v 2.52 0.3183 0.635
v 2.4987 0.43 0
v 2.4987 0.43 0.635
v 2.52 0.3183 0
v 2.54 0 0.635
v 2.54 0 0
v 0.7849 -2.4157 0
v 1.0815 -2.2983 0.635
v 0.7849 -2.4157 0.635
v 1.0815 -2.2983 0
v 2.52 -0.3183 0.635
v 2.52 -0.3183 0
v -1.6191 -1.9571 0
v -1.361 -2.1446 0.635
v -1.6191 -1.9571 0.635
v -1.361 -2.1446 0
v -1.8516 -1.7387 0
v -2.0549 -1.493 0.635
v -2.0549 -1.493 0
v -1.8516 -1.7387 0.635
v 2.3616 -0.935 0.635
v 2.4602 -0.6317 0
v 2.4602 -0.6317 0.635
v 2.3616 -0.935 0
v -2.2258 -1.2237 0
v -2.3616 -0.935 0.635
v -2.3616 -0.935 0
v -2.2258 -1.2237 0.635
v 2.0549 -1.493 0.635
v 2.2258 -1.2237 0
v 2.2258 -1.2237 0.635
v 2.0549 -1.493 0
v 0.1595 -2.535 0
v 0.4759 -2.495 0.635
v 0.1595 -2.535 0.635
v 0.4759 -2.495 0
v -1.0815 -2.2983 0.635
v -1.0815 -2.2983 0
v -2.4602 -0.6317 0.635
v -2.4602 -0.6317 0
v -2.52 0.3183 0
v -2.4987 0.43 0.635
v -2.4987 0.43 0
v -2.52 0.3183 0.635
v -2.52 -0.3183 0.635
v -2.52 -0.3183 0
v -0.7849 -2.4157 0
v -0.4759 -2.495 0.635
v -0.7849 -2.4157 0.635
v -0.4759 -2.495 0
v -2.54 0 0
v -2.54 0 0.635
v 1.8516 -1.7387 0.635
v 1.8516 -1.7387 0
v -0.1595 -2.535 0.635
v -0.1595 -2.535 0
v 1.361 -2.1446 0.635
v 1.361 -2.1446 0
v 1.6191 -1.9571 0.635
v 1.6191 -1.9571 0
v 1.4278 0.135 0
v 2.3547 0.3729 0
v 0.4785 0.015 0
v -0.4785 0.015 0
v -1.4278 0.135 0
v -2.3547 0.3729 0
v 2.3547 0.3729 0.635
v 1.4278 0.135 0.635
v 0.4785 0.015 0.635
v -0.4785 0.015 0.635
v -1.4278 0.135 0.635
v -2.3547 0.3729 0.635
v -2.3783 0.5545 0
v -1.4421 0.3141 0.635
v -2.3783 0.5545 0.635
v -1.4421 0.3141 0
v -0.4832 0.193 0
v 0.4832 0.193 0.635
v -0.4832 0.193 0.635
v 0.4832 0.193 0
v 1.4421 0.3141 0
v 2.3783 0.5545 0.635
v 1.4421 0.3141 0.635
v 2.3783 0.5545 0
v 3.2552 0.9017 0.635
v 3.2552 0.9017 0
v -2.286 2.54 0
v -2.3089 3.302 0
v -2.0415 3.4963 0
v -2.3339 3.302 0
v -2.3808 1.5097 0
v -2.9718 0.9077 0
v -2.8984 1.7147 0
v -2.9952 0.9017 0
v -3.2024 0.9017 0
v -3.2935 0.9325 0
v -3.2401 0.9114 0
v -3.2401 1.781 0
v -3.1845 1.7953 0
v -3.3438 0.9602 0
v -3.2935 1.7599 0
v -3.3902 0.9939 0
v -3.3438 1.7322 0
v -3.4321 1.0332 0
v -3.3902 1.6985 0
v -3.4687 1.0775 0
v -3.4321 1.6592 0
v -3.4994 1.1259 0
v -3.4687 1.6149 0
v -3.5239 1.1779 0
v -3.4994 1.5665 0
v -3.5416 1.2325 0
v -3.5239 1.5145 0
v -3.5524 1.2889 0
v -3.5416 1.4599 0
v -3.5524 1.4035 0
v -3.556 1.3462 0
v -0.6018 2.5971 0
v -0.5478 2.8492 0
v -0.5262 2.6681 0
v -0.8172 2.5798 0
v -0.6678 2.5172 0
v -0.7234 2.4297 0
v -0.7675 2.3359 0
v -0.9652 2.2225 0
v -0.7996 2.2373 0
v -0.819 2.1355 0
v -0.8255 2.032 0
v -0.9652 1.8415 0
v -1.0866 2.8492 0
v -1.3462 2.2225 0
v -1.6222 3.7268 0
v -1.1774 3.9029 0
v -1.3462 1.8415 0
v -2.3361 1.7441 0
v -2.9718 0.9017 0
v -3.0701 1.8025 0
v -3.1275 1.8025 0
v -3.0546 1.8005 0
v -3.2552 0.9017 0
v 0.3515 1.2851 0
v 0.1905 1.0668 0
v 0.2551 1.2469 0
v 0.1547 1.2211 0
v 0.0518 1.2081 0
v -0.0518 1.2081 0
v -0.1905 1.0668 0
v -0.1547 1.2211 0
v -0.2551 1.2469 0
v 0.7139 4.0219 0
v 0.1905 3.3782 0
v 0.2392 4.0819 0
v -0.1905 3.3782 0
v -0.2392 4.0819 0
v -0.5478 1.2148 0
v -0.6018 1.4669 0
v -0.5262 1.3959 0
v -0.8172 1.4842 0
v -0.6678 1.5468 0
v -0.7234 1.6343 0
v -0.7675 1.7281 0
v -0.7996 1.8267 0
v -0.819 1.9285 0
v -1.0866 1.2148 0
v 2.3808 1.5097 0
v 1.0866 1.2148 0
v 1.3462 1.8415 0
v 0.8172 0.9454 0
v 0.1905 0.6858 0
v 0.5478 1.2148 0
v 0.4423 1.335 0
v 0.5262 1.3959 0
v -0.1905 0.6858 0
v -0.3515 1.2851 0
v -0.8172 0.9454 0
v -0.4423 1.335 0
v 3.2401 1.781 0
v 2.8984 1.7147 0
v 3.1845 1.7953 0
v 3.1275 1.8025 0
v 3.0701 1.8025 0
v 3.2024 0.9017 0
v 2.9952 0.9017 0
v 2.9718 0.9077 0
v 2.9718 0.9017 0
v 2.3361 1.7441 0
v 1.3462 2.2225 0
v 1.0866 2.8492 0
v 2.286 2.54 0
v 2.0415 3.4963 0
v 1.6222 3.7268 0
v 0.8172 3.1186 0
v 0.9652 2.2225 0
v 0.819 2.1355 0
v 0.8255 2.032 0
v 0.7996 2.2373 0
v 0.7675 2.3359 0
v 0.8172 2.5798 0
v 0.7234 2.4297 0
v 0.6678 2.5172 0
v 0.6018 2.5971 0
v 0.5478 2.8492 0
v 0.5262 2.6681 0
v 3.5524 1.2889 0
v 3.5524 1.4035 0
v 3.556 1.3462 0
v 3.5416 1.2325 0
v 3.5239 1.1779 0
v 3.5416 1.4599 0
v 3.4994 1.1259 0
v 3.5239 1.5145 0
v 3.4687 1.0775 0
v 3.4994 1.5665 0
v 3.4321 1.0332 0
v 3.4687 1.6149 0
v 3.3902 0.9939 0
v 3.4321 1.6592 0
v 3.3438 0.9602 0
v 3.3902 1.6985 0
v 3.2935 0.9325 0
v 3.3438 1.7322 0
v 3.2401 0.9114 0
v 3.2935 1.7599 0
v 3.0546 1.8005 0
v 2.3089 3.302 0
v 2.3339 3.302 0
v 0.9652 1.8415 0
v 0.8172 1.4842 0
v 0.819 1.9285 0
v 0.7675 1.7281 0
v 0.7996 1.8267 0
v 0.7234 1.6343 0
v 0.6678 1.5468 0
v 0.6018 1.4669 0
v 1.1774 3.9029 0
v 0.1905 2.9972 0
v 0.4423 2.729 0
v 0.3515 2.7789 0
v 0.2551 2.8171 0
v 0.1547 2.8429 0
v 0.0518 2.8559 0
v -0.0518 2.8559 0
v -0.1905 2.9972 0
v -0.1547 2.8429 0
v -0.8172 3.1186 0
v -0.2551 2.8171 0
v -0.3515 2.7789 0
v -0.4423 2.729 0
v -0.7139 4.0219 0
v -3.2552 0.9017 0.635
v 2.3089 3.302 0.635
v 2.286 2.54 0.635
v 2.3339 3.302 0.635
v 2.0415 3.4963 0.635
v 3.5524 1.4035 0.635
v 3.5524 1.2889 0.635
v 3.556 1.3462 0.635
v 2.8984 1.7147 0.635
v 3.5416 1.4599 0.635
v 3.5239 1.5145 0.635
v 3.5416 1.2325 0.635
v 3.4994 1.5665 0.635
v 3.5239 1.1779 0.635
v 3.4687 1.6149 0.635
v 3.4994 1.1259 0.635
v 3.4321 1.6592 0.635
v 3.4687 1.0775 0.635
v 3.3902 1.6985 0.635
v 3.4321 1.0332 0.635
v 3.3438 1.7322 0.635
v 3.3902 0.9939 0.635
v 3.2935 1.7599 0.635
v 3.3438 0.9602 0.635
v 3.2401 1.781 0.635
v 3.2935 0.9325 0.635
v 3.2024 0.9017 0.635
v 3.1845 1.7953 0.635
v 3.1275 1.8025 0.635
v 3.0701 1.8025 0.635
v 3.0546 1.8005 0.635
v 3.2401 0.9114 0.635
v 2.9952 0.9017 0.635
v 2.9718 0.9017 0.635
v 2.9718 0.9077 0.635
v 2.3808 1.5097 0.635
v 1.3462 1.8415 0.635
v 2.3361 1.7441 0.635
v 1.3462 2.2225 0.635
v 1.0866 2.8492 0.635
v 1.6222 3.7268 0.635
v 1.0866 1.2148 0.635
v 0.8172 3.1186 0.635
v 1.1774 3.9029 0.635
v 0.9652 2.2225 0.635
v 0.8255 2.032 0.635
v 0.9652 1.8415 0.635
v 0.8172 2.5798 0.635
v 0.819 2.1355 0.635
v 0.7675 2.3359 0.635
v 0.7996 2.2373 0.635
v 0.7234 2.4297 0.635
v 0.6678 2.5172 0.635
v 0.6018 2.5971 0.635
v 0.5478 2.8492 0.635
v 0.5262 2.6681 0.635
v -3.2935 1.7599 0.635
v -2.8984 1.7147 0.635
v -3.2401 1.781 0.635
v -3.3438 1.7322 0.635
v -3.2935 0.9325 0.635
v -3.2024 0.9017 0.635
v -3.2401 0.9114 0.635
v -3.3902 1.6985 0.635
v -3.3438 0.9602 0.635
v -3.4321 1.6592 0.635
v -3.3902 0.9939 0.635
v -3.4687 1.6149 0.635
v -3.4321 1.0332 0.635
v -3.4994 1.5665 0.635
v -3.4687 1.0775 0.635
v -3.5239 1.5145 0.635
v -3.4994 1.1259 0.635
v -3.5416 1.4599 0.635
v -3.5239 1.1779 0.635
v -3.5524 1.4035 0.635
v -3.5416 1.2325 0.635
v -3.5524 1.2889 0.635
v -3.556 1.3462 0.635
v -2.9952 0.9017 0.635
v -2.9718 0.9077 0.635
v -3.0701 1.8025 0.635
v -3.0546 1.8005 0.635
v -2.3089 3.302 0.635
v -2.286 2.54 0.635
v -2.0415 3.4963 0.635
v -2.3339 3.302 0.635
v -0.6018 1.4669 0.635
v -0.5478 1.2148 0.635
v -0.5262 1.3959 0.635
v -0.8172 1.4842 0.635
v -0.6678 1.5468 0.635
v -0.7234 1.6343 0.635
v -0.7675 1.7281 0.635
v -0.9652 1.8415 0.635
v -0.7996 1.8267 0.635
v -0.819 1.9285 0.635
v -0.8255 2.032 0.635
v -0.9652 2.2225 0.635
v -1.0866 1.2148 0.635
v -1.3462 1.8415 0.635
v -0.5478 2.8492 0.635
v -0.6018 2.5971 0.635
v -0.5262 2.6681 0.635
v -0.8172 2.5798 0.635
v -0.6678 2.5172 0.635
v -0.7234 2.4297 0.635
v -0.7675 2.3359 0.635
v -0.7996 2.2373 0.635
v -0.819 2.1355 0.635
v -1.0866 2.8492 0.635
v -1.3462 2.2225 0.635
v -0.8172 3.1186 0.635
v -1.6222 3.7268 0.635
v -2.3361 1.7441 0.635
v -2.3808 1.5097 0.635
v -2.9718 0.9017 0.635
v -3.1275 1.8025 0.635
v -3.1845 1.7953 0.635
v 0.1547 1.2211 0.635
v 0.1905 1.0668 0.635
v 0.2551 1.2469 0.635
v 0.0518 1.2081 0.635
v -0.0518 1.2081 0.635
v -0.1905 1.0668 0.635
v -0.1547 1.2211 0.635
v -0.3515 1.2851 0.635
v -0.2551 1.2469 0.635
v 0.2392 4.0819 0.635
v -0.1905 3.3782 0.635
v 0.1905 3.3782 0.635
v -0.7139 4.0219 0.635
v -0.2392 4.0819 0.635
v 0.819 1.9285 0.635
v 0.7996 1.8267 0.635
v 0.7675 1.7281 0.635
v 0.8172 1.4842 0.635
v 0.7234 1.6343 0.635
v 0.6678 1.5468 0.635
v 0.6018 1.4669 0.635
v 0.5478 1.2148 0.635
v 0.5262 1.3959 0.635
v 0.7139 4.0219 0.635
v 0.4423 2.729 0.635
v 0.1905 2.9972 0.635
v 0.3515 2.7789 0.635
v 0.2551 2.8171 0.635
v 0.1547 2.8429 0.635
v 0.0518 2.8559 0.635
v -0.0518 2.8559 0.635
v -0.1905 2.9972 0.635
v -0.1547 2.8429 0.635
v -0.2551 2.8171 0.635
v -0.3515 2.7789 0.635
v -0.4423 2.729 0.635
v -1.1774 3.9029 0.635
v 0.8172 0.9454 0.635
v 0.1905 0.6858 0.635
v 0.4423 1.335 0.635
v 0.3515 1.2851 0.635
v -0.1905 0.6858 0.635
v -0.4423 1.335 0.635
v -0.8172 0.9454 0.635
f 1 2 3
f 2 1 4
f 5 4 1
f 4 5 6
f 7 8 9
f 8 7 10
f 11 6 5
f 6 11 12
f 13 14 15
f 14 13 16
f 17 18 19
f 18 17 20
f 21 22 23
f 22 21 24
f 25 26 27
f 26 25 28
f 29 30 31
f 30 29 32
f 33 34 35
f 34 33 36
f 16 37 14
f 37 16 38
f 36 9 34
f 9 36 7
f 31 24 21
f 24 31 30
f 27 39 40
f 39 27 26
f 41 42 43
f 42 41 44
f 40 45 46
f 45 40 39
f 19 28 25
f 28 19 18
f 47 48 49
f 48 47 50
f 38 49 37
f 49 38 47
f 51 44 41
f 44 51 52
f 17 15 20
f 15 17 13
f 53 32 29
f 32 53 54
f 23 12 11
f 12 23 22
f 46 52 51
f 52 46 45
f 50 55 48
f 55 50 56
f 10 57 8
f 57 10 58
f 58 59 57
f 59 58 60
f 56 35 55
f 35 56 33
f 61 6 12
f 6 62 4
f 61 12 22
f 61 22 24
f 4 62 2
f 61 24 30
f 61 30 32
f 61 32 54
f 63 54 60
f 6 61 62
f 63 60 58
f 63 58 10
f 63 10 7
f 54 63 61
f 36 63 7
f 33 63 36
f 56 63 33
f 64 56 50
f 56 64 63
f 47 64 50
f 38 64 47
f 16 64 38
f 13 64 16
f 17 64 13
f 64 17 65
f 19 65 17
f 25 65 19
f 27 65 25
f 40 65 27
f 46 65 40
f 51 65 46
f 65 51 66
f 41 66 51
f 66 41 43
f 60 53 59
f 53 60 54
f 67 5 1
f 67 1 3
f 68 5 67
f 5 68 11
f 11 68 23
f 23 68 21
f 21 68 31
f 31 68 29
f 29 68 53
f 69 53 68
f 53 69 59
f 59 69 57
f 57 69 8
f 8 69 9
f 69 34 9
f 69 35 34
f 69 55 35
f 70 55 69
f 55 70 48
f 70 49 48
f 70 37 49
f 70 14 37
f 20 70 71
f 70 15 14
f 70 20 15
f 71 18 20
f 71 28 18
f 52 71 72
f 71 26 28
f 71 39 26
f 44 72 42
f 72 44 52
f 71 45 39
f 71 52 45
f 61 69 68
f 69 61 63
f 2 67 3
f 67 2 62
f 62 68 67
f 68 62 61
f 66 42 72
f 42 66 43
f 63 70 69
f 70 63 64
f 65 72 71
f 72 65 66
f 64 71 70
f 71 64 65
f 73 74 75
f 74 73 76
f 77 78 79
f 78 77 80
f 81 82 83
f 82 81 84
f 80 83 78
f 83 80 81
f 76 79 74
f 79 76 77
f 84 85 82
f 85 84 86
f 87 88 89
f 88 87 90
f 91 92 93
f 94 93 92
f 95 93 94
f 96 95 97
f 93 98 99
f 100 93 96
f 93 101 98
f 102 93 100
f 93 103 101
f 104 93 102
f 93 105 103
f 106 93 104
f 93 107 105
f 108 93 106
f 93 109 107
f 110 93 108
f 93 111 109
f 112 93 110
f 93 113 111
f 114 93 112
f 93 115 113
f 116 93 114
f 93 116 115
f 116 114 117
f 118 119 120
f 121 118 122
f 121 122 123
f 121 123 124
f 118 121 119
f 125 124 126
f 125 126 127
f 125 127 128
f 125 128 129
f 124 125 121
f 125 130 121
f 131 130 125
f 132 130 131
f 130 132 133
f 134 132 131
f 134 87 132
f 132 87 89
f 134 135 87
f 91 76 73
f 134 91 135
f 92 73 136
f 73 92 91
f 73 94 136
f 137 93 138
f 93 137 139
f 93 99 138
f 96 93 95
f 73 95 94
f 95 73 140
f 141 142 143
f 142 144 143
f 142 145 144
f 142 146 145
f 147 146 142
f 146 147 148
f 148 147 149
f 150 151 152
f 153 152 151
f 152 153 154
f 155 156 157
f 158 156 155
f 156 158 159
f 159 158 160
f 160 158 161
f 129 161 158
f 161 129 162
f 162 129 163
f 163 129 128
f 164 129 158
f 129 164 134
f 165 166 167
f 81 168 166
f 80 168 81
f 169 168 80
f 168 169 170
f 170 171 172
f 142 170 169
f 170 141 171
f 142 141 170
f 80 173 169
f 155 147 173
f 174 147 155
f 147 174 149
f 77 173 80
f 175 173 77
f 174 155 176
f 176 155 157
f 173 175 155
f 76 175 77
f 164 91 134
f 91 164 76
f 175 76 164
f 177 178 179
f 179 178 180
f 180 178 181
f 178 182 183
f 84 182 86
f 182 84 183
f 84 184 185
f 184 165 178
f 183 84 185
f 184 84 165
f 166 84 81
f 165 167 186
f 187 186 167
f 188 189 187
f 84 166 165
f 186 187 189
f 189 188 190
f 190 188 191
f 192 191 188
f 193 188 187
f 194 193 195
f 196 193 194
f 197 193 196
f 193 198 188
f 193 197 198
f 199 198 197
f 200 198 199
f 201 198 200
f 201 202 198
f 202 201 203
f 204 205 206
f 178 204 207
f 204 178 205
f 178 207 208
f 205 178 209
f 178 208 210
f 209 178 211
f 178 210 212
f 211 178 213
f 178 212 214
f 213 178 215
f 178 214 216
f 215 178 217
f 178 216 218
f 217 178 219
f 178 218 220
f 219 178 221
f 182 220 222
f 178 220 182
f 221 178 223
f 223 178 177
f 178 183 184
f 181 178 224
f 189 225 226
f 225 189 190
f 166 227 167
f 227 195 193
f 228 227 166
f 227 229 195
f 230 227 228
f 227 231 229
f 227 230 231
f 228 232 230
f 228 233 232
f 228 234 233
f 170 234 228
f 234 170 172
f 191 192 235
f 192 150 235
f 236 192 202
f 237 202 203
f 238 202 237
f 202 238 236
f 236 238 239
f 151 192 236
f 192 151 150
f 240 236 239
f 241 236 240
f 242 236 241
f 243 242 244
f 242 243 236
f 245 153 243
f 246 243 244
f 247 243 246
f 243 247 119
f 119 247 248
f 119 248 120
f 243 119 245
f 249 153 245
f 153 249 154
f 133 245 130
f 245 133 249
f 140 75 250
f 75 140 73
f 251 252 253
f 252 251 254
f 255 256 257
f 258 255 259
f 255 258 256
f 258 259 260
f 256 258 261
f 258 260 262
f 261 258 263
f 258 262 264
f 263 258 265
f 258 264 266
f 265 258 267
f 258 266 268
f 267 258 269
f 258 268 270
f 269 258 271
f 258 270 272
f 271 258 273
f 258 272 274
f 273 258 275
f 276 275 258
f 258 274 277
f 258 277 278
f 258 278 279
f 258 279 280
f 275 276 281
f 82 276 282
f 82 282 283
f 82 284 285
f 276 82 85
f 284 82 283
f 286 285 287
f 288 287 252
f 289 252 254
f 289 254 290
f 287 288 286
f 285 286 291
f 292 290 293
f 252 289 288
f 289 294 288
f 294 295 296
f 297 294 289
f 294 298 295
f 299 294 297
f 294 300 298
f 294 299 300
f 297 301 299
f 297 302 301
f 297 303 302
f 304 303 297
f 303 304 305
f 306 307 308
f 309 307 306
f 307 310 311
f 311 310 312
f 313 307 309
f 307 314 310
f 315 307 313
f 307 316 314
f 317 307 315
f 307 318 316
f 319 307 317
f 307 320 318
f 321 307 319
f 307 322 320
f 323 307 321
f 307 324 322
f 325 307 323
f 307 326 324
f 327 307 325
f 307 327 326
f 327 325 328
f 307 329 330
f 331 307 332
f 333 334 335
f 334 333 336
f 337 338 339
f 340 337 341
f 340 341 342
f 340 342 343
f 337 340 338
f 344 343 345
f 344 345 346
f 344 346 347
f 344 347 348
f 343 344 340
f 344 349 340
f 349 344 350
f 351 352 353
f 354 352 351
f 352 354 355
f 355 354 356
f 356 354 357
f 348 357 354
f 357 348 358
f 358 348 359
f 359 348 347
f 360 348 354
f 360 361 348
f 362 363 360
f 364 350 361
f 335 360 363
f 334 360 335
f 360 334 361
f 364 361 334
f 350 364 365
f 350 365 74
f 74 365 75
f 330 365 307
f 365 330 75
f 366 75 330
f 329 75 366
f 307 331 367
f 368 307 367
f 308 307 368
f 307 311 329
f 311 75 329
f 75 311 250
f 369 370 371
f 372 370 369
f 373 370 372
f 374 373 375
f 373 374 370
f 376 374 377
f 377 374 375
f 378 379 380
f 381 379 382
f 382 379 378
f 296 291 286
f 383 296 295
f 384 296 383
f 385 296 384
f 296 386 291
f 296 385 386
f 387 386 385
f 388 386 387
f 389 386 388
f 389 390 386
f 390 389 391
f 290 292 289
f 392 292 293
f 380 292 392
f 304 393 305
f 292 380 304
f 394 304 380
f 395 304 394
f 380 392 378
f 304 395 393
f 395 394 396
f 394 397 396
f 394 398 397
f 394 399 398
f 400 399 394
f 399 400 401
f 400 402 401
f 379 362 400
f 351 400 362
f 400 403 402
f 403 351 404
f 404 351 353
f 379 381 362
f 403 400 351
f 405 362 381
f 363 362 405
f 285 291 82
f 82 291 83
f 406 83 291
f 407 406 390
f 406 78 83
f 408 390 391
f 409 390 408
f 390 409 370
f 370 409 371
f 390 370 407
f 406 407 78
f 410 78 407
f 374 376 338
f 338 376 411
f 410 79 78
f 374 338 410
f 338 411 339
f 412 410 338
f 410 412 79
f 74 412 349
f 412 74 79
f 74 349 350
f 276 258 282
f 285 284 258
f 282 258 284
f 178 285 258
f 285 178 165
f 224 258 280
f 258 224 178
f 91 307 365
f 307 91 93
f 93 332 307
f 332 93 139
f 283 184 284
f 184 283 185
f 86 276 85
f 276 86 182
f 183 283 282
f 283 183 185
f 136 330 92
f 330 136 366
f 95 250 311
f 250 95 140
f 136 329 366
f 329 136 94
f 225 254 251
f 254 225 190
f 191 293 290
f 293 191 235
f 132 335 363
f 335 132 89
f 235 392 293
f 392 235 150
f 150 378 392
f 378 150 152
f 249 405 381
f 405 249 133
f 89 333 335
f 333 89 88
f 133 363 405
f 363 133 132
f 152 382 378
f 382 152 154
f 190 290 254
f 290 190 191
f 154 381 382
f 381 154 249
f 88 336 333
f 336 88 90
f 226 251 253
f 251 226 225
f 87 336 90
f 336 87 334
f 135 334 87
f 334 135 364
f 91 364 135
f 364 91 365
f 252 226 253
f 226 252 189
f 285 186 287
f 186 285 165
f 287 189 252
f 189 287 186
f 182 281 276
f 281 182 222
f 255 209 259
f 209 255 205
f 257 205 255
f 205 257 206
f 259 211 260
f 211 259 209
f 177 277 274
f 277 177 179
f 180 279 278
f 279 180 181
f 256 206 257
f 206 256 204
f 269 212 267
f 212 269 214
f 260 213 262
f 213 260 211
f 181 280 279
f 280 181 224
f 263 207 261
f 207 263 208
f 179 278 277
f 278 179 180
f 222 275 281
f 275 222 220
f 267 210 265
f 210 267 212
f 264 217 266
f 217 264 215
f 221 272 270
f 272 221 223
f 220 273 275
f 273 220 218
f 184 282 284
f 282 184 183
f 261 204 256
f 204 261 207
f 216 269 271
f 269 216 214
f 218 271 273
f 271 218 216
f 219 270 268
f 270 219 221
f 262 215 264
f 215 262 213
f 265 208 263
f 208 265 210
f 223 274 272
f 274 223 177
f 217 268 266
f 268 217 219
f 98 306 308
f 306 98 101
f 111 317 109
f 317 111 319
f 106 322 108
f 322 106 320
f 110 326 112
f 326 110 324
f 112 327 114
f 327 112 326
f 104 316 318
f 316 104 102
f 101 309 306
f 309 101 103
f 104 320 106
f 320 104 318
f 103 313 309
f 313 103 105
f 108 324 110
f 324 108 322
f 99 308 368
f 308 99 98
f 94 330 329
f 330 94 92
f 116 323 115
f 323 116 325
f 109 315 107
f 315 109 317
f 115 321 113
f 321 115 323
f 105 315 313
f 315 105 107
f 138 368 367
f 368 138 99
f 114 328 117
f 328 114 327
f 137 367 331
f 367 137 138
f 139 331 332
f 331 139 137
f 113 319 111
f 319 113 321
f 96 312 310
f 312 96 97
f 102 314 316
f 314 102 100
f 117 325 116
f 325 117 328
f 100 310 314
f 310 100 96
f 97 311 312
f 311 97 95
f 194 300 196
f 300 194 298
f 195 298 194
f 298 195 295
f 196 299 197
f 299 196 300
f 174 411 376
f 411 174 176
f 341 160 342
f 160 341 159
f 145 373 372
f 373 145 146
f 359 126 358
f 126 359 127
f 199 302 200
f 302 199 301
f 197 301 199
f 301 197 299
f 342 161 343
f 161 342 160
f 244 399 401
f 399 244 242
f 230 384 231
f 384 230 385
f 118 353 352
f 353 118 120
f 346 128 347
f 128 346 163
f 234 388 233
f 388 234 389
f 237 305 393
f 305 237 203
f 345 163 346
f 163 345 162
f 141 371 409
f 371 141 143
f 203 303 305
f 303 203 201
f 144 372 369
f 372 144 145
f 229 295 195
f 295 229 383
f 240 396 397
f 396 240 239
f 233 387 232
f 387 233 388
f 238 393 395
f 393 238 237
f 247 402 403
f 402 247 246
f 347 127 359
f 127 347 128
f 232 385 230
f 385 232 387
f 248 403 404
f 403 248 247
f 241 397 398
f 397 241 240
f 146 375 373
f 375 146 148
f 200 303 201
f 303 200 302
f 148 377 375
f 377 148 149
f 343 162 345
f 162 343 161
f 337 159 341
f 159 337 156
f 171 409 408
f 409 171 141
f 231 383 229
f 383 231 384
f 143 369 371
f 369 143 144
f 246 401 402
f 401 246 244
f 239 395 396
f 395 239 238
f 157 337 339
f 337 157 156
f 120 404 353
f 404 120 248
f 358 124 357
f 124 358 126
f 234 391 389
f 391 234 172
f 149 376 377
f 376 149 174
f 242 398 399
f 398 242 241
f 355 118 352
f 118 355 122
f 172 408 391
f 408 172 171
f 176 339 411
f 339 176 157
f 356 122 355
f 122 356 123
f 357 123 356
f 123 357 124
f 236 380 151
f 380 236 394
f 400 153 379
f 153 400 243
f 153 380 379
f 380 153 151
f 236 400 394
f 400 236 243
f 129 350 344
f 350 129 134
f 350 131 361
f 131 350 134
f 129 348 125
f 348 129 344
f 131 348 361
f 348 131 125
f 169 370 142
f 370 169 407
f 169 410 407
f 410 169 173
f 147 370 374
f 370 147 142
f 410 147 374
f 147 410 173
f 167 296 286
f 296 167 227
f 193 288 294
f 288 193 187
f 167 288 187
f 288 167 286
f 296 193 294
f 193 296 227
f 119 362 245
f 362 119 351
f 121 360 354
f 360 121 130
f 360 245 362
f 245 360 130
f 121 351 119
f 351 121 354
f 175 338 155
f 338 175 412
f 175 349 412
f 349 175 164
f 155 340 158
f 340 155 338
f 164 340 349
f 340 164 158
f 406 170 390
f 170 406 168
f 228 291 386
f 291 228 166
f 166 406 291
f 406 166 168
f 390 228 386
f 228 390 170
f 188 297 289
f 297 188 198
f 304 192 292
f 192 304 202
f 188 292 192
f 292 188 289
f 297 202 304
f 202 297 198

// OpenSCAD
//you can change the mm value to change the scale of hatguy (using the actual value, 25.4, makes him about 2.5 inches wide, using 2.54 makes it .25 inches wide, etc)

function mm(i) = i*2.54;

$fn=50;



module hatguy()
{
	union()
	{
		difference()
		{
			union()
			{
				difference()
				{
					cylinder(mm(.25), mm(1), mm(1), 0);
					translate([0, mm(3), -1])
					{
						cylinder(mm(.25)+2, mm(3), mm(3), 0);
					}
			
				}
			
				difference()
				{
					translate([0, mm(3.1), 0])
						{
							cylinder(mm(.25), mm(3.03), mm(3.03), 0);
						}
					translate([0, mm(3.1), -1])
						{
							cylinder(mm(.25)+2, mm(2.68), mm(2.68), 0);
						}
					translate([-mm(4),mm(.7),-1])
						{
							cube([mm(8), mm(8), mm(.25)+2]);	
						}
					translate([mm(1.17),mm(.355),-1])
						{
							cube([mm(.7), mm(.7), mm(.25)+2]);
						}
					translate([-mm(1.87),mm(.355),-1])
						{	
							cube([mm(.7), mm(.7), mm(.25)+2]);
						}
				}

				difference()
					{
					union()
					{
						translate([-mm(1),mm(.3),0])
							{
							cube([mm(2), mm(1), mm(.25)]);
							}
						translate([0,mm(.11),0])
							{
								difference()
								{
									cylinder(mm(.25), mm(1.5), mm(1.5));
									translate([-mm(2), -mm(3), -1])
									{
										cube([mm(4), mm(4), mm(.25)+2]);
									}
								}
							}
					}


					translate([-mm(3.4),mm(1),-1])
						{
							cylinder(mm(.25)+2, mm(2.5), mm(2.5), 0);
						}
					translate([mm(3.4),mm(1),-1])
						{
							cylinder(mm(.25)+2, mm(2.5), mm(2.5), 0);
						}
					}

			difference()
				{
			translate([mm(1.22),mm(.53),0])
						{
							cylinder(mm(.25), mm(.18), mm(.18), 0);
						}		
			translate([0, mm(3.1), -1])
						{
							cylinder(mm(.25)+2, mm(2.68), mm(2.68), 0);
						}
				}
		
		difference()
				{
			translate([-mm(1.22),mm(.53),0])
					{
						cylinder(mm(.25), mm(.18), mm(.18), 0);
					}	
			translate([0, mm(3.1), -1])
					{
						cylinder(mm(.25)+2, mm(2.68), mm(2.68), 0);
					}
			}
	}

	translate([0,mm(.8),-1])
		{
			cylinder(mm(.25)+2, mm(.325), mm(.325), 0);
		
			translate([-mm(.15/2), mm(.38), -2])
			{
				cube([mm(.15), mm(.15), mm(.25)+4]);
			}
		
			rotate([0, 0, 90])
			{	
				translate([-mm(.15/2), mm(.38), -2])
				{
					cube([mm(.15), mm(.15), mm(.25)+4]);
				}
			}
	
		rotate([0, 0, 180])
			{	
				translate([-mm(.15/2), mm(.38), -2])
				{
					cube([mm(.15), mm(.15), mm(.25)+4]);
				}
			}
		
		rotate([0, 0, 270])
			{	
				translate([-mm(.15/2), mm(.38), -2])
				{
					cube([mm(.15), mm(.15), mm(.25)+4]);
				}
			}

		rotate([0, 0, 45])
			{	
				translate([-mm(.15/2), mm(.38), -2])
				{
					cube([mm(.15), mm(.15), mm(.25)+4]);
				}
			}

		rotate([0, 0, 135])
			{	
				translate([-mm(.15/2), mm(.38), -2])
				{
					cube([mm(.15), mm(.15), mm(.25)+4]);
				}
			}	

		rotate([0, 0, 225])
			{	
				translate([-mm(.15/2), mm(.38), -2])
				{
					cube([mm(.15), mm(.15), mm(.25)+4]);
				}
			}
		
		rotate([0, 0, 315])
			{	
				translate([-mm(.15/2), mm(.38), -2])
				{
					cube([mm(.15), mm(.15), mm(.25)+4]);
				}
			}
		}
	}



			
	}
}

hatguy();
